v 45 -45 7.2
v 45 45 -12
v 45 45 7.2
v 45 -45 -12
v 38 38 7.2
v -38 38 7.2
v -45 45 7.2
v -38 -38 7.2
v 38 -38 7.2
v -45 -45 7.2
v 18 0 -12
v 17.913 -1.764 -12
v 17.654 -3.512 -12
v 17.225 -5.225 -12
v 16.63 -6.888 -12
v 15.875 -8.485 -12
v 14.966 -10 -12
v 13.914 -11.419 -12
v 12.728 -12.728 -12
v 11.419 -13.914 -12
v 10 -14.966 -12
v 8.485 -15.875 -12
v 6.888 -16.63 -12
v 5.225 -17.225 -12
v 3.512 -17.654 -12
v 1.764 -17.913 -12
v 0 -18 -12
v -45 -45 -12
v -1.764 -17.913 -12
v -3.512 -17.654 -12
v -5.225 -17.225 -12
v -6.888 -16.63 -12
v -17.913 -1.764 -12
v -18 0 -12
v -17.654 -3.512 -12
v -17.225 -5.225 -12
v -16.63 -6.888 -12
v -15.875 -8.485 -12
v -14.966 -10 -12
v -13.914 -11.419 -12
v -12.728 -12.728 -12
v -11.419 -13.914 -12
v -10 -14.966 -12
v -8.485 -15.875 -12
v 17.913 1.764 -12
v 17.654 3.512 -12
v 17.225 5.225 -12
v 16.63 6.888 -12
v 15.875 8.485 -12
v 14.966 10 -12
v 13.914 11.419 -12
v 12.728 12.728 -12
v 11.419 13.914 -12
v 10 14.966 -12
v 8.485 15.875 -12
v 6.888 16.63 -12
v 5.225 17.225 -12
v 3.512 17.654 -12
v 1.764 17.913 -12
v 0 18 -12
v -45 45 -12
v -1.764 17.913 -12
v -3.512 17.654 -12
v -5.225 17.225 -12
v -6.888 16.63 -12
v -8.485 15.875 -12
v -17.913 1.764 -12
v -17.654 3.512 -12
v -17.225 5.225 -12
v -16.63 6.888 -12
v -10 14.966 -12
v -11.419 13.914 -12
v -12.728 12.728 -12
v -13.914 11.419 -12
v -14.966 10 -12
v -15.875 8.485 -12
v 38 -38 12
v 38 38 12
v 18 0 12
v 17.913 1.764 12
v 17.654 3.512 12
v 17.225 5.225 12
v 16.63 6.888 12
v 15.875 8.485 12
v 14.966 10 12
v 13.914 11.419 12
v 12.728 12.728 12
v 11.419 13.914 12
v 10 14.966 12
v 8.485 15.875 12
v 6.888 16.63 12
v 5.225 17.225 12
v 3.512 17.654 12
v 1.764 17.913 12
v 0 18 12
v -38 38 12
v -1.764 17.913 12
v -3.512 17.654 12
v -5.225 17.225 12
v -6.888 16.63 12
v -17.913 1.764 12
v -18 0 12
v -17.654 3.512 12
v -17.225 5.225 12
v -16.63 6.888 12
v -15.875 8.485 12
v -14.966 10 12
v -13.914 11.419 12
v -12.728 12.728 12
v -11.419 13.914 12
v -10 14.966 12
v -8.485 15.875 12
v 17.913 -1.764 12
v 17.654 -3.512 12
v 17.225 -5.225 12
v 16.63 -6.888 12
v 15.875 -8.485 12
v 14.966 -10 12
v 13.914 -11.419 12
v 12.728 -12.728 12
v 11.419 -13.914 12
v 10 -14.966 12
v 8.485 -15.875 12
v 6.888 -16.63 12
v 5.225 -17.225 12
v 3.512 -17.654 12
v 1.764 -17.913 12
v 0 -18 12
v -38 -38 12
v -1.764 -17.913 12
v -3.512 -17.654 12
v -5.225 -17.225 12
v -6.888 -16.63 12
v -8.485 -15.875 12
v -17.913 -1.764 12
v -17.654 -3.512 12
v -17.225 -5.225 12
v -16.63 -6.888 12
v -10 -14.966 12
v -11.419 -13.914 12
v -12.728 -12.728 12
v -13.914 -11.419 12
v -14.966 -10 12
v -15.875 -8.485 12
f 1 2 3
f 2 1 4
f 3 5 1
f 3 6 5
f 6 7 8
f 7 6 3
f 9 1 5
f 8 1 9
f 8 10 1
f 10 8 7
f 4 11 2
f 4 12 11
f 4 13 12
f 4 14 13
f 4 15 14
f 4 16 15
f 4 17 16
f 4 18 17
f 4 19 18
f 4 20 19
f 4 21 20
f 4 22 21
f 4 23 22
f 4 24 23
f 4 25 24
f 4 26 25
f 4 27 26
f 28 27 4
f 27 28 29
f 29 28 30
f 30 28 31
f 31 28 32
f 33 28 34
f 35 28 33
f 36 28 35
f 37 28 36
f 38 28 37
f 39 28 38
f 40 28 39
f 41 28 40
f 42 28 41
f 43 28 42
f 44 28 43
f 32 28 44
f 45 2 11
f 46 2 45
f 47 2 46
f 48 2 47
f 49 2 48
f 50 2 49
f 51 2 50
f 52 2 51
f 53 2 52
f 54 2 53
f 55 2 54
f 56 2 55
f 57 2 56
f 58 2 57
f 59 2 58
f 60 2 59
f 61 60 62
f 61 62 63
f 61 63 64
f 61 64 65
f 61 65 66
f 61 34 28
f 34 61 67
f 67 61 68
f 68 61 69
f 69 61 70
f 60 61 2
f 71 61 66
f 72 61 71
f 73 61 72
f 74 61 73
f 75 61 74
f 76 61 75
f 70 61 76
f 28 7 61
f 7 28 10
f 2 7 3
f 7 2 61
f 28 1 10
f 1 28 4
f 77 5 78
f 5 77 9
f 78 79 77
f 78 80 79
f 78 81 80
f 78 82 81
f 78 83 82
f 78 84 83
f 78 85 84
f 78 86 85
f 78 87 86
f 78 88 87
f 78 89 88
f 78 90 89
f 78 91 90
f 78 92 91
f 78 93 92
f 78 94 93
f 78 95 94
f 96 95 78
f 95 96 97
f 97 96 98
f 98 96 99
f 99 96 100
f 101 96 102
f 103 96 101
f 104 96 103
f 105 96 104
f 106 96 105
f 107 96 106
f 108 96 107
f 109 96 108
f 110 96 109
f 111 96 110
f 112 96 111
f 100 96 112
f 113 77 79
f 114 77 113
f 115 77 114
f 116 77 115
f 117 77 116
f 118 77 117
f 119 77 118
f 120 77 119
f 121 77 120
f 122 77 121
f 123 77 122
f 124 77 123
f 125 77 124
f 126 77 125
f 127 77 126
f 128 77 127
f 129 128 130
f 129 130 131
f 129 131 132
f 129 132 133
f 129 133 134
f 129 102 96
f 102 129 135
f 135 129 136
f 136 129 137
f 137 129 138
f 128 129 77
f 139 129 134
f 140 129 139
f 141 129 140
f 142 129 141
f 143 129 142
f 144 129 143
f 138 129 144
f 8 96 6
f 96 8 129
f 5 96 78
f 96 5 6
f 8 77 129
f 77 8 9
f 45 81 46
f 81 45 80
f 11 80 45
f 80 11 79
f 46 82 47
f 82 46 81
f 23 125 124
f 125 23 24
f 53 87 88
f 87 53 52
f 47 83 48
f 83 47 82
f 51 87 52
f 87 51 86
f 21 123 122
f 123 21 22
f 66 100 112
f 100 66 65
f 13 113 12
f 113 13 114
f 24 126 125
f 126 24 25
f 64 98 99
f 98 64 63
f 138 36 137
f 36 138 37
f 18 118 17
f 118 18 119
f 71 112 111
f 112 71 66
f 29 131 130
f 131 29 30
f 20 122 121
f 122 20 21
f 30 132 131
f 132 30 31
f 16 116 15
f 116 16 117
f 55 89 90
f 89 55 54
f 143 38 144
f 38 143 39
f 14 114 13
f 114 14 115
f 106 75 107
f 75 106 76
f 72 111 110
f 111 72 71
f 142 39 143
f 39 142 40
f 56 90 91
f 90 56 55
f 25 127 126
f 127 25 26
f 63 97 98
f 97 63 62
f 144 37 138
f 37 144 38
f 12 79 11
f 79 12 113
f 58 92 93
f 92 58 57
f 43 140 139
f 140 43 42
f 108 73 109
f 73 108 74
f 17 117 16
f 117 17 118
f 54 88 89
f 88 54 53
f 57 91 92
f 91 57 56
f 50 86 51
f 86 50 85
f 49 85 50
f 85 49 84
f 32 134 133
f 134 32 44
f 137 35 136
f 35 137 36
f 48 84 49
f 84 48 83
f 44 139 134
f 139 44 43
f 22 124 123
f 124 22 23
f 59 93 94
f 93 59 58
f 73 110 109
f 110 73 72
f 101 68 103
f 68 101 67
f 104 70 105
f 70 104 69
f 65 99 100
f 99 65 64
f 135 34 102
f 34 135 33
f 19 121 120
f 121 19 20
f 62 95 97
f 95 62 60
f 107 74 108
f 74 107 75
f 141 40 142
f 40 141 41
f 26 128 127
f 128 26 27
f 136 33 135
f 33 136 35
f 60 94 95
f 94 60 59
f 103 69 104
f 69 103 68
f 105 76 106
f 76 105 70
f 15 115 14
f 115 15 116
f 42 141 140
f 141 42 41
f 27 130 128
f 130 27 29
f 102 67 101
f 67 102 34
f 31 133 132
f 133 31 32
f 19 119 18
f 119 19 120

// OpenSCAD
// ============================================================================
// Atom Lithography Machine — Parametric OpenSCAD Module (S4.3-01)
// ============================================================================
// part_id           : S4.3-01
// parent_bom_id     : S4.3
// subsystem         : S4
// part_name         : 6-DOF UHV ince piezo flekstur kademesi (PI PIMars P-562/563 UHV sinifi)
// material          : Ti-6Al-4V
// temp_stage        : 300 K (UHV)
// vacuum_grade      : UHV 1e-9 mbar
// tolerance         : ±0.2 nm RMS
// computed_mass_kg  : 0.54888
// envelope_mm       : 90.000 x 90.000 x 24.500
// design_maturity   : M0_M1_DETAILED_CAD_DESIGN_ONLY
// no_lab_measurement: true
// iec61508_certified: false
// semi_s2_certified : false
// Units: millimeters (mm)
// ============================================================================

$fn = 64;

// Nominal bounding envelope parameters (mm)
bbox_x = 90.0000;
bbox_y = 90.0000;
bbox_z = 24.5000;

// Part-specific parametric dimensions
stage_xy_mm = 90.0;
stage_h_mm = 24.5;
stroke_um = 200.0;
blade_tx_mm = 1.96;
blade_ty_mm = 1.29;
k_eff_target_MN_m = 2.174;
n_flexure_slots = 8;
n_pzt_stacks = 8;
top_deck_gap_mm = 0.0;
bore_d_mm = 36.0;

// Interface / port parameters (mm)
port_vespel_standoff_deck_bore = 36.000;
port_coarse_stage_mount_bolts = 4;

module part_S4_3_01() {
  difference() {
    union() {
      // Ti-6Al-4V monolithic double-compound serpentine EDM flexure body (k_eff~2.17 MN/m)
      translate([0.000, 0.000, -2.400]) cube([90.000, 90.000, 19.200], center=true);
      // Invar-36 6-DOF moving stage platform (0.000 mm flush mate)
      translate([0.000, 0.000, 9.600]) cube([76.000, 76.000, 4.800], center=true);
      // Embedded UHV PZT X-axis actuator stack
      translate([0.000, 33.250, -2.400]) cube([16.000, 3.200, 14.000], center=true);
      // Embedded UHV PZT Y-axis actuator stack
      translate([24.500, 0.000, -2.400]) cube([3.200, 16.000, 14.000], center=true);
    }
    // Central Ø36 mm axial clear aperture
    cylinder(d=36.000, h=28.000, center=true);
  }
}

// World assembly mounting transform (global machine frame, mm / deg):
// translate([0.000, 0.000, -41.000]) rotate([0.000, 0.000, 0.000]) part_S4_3_01();

part_S4_3_01();
